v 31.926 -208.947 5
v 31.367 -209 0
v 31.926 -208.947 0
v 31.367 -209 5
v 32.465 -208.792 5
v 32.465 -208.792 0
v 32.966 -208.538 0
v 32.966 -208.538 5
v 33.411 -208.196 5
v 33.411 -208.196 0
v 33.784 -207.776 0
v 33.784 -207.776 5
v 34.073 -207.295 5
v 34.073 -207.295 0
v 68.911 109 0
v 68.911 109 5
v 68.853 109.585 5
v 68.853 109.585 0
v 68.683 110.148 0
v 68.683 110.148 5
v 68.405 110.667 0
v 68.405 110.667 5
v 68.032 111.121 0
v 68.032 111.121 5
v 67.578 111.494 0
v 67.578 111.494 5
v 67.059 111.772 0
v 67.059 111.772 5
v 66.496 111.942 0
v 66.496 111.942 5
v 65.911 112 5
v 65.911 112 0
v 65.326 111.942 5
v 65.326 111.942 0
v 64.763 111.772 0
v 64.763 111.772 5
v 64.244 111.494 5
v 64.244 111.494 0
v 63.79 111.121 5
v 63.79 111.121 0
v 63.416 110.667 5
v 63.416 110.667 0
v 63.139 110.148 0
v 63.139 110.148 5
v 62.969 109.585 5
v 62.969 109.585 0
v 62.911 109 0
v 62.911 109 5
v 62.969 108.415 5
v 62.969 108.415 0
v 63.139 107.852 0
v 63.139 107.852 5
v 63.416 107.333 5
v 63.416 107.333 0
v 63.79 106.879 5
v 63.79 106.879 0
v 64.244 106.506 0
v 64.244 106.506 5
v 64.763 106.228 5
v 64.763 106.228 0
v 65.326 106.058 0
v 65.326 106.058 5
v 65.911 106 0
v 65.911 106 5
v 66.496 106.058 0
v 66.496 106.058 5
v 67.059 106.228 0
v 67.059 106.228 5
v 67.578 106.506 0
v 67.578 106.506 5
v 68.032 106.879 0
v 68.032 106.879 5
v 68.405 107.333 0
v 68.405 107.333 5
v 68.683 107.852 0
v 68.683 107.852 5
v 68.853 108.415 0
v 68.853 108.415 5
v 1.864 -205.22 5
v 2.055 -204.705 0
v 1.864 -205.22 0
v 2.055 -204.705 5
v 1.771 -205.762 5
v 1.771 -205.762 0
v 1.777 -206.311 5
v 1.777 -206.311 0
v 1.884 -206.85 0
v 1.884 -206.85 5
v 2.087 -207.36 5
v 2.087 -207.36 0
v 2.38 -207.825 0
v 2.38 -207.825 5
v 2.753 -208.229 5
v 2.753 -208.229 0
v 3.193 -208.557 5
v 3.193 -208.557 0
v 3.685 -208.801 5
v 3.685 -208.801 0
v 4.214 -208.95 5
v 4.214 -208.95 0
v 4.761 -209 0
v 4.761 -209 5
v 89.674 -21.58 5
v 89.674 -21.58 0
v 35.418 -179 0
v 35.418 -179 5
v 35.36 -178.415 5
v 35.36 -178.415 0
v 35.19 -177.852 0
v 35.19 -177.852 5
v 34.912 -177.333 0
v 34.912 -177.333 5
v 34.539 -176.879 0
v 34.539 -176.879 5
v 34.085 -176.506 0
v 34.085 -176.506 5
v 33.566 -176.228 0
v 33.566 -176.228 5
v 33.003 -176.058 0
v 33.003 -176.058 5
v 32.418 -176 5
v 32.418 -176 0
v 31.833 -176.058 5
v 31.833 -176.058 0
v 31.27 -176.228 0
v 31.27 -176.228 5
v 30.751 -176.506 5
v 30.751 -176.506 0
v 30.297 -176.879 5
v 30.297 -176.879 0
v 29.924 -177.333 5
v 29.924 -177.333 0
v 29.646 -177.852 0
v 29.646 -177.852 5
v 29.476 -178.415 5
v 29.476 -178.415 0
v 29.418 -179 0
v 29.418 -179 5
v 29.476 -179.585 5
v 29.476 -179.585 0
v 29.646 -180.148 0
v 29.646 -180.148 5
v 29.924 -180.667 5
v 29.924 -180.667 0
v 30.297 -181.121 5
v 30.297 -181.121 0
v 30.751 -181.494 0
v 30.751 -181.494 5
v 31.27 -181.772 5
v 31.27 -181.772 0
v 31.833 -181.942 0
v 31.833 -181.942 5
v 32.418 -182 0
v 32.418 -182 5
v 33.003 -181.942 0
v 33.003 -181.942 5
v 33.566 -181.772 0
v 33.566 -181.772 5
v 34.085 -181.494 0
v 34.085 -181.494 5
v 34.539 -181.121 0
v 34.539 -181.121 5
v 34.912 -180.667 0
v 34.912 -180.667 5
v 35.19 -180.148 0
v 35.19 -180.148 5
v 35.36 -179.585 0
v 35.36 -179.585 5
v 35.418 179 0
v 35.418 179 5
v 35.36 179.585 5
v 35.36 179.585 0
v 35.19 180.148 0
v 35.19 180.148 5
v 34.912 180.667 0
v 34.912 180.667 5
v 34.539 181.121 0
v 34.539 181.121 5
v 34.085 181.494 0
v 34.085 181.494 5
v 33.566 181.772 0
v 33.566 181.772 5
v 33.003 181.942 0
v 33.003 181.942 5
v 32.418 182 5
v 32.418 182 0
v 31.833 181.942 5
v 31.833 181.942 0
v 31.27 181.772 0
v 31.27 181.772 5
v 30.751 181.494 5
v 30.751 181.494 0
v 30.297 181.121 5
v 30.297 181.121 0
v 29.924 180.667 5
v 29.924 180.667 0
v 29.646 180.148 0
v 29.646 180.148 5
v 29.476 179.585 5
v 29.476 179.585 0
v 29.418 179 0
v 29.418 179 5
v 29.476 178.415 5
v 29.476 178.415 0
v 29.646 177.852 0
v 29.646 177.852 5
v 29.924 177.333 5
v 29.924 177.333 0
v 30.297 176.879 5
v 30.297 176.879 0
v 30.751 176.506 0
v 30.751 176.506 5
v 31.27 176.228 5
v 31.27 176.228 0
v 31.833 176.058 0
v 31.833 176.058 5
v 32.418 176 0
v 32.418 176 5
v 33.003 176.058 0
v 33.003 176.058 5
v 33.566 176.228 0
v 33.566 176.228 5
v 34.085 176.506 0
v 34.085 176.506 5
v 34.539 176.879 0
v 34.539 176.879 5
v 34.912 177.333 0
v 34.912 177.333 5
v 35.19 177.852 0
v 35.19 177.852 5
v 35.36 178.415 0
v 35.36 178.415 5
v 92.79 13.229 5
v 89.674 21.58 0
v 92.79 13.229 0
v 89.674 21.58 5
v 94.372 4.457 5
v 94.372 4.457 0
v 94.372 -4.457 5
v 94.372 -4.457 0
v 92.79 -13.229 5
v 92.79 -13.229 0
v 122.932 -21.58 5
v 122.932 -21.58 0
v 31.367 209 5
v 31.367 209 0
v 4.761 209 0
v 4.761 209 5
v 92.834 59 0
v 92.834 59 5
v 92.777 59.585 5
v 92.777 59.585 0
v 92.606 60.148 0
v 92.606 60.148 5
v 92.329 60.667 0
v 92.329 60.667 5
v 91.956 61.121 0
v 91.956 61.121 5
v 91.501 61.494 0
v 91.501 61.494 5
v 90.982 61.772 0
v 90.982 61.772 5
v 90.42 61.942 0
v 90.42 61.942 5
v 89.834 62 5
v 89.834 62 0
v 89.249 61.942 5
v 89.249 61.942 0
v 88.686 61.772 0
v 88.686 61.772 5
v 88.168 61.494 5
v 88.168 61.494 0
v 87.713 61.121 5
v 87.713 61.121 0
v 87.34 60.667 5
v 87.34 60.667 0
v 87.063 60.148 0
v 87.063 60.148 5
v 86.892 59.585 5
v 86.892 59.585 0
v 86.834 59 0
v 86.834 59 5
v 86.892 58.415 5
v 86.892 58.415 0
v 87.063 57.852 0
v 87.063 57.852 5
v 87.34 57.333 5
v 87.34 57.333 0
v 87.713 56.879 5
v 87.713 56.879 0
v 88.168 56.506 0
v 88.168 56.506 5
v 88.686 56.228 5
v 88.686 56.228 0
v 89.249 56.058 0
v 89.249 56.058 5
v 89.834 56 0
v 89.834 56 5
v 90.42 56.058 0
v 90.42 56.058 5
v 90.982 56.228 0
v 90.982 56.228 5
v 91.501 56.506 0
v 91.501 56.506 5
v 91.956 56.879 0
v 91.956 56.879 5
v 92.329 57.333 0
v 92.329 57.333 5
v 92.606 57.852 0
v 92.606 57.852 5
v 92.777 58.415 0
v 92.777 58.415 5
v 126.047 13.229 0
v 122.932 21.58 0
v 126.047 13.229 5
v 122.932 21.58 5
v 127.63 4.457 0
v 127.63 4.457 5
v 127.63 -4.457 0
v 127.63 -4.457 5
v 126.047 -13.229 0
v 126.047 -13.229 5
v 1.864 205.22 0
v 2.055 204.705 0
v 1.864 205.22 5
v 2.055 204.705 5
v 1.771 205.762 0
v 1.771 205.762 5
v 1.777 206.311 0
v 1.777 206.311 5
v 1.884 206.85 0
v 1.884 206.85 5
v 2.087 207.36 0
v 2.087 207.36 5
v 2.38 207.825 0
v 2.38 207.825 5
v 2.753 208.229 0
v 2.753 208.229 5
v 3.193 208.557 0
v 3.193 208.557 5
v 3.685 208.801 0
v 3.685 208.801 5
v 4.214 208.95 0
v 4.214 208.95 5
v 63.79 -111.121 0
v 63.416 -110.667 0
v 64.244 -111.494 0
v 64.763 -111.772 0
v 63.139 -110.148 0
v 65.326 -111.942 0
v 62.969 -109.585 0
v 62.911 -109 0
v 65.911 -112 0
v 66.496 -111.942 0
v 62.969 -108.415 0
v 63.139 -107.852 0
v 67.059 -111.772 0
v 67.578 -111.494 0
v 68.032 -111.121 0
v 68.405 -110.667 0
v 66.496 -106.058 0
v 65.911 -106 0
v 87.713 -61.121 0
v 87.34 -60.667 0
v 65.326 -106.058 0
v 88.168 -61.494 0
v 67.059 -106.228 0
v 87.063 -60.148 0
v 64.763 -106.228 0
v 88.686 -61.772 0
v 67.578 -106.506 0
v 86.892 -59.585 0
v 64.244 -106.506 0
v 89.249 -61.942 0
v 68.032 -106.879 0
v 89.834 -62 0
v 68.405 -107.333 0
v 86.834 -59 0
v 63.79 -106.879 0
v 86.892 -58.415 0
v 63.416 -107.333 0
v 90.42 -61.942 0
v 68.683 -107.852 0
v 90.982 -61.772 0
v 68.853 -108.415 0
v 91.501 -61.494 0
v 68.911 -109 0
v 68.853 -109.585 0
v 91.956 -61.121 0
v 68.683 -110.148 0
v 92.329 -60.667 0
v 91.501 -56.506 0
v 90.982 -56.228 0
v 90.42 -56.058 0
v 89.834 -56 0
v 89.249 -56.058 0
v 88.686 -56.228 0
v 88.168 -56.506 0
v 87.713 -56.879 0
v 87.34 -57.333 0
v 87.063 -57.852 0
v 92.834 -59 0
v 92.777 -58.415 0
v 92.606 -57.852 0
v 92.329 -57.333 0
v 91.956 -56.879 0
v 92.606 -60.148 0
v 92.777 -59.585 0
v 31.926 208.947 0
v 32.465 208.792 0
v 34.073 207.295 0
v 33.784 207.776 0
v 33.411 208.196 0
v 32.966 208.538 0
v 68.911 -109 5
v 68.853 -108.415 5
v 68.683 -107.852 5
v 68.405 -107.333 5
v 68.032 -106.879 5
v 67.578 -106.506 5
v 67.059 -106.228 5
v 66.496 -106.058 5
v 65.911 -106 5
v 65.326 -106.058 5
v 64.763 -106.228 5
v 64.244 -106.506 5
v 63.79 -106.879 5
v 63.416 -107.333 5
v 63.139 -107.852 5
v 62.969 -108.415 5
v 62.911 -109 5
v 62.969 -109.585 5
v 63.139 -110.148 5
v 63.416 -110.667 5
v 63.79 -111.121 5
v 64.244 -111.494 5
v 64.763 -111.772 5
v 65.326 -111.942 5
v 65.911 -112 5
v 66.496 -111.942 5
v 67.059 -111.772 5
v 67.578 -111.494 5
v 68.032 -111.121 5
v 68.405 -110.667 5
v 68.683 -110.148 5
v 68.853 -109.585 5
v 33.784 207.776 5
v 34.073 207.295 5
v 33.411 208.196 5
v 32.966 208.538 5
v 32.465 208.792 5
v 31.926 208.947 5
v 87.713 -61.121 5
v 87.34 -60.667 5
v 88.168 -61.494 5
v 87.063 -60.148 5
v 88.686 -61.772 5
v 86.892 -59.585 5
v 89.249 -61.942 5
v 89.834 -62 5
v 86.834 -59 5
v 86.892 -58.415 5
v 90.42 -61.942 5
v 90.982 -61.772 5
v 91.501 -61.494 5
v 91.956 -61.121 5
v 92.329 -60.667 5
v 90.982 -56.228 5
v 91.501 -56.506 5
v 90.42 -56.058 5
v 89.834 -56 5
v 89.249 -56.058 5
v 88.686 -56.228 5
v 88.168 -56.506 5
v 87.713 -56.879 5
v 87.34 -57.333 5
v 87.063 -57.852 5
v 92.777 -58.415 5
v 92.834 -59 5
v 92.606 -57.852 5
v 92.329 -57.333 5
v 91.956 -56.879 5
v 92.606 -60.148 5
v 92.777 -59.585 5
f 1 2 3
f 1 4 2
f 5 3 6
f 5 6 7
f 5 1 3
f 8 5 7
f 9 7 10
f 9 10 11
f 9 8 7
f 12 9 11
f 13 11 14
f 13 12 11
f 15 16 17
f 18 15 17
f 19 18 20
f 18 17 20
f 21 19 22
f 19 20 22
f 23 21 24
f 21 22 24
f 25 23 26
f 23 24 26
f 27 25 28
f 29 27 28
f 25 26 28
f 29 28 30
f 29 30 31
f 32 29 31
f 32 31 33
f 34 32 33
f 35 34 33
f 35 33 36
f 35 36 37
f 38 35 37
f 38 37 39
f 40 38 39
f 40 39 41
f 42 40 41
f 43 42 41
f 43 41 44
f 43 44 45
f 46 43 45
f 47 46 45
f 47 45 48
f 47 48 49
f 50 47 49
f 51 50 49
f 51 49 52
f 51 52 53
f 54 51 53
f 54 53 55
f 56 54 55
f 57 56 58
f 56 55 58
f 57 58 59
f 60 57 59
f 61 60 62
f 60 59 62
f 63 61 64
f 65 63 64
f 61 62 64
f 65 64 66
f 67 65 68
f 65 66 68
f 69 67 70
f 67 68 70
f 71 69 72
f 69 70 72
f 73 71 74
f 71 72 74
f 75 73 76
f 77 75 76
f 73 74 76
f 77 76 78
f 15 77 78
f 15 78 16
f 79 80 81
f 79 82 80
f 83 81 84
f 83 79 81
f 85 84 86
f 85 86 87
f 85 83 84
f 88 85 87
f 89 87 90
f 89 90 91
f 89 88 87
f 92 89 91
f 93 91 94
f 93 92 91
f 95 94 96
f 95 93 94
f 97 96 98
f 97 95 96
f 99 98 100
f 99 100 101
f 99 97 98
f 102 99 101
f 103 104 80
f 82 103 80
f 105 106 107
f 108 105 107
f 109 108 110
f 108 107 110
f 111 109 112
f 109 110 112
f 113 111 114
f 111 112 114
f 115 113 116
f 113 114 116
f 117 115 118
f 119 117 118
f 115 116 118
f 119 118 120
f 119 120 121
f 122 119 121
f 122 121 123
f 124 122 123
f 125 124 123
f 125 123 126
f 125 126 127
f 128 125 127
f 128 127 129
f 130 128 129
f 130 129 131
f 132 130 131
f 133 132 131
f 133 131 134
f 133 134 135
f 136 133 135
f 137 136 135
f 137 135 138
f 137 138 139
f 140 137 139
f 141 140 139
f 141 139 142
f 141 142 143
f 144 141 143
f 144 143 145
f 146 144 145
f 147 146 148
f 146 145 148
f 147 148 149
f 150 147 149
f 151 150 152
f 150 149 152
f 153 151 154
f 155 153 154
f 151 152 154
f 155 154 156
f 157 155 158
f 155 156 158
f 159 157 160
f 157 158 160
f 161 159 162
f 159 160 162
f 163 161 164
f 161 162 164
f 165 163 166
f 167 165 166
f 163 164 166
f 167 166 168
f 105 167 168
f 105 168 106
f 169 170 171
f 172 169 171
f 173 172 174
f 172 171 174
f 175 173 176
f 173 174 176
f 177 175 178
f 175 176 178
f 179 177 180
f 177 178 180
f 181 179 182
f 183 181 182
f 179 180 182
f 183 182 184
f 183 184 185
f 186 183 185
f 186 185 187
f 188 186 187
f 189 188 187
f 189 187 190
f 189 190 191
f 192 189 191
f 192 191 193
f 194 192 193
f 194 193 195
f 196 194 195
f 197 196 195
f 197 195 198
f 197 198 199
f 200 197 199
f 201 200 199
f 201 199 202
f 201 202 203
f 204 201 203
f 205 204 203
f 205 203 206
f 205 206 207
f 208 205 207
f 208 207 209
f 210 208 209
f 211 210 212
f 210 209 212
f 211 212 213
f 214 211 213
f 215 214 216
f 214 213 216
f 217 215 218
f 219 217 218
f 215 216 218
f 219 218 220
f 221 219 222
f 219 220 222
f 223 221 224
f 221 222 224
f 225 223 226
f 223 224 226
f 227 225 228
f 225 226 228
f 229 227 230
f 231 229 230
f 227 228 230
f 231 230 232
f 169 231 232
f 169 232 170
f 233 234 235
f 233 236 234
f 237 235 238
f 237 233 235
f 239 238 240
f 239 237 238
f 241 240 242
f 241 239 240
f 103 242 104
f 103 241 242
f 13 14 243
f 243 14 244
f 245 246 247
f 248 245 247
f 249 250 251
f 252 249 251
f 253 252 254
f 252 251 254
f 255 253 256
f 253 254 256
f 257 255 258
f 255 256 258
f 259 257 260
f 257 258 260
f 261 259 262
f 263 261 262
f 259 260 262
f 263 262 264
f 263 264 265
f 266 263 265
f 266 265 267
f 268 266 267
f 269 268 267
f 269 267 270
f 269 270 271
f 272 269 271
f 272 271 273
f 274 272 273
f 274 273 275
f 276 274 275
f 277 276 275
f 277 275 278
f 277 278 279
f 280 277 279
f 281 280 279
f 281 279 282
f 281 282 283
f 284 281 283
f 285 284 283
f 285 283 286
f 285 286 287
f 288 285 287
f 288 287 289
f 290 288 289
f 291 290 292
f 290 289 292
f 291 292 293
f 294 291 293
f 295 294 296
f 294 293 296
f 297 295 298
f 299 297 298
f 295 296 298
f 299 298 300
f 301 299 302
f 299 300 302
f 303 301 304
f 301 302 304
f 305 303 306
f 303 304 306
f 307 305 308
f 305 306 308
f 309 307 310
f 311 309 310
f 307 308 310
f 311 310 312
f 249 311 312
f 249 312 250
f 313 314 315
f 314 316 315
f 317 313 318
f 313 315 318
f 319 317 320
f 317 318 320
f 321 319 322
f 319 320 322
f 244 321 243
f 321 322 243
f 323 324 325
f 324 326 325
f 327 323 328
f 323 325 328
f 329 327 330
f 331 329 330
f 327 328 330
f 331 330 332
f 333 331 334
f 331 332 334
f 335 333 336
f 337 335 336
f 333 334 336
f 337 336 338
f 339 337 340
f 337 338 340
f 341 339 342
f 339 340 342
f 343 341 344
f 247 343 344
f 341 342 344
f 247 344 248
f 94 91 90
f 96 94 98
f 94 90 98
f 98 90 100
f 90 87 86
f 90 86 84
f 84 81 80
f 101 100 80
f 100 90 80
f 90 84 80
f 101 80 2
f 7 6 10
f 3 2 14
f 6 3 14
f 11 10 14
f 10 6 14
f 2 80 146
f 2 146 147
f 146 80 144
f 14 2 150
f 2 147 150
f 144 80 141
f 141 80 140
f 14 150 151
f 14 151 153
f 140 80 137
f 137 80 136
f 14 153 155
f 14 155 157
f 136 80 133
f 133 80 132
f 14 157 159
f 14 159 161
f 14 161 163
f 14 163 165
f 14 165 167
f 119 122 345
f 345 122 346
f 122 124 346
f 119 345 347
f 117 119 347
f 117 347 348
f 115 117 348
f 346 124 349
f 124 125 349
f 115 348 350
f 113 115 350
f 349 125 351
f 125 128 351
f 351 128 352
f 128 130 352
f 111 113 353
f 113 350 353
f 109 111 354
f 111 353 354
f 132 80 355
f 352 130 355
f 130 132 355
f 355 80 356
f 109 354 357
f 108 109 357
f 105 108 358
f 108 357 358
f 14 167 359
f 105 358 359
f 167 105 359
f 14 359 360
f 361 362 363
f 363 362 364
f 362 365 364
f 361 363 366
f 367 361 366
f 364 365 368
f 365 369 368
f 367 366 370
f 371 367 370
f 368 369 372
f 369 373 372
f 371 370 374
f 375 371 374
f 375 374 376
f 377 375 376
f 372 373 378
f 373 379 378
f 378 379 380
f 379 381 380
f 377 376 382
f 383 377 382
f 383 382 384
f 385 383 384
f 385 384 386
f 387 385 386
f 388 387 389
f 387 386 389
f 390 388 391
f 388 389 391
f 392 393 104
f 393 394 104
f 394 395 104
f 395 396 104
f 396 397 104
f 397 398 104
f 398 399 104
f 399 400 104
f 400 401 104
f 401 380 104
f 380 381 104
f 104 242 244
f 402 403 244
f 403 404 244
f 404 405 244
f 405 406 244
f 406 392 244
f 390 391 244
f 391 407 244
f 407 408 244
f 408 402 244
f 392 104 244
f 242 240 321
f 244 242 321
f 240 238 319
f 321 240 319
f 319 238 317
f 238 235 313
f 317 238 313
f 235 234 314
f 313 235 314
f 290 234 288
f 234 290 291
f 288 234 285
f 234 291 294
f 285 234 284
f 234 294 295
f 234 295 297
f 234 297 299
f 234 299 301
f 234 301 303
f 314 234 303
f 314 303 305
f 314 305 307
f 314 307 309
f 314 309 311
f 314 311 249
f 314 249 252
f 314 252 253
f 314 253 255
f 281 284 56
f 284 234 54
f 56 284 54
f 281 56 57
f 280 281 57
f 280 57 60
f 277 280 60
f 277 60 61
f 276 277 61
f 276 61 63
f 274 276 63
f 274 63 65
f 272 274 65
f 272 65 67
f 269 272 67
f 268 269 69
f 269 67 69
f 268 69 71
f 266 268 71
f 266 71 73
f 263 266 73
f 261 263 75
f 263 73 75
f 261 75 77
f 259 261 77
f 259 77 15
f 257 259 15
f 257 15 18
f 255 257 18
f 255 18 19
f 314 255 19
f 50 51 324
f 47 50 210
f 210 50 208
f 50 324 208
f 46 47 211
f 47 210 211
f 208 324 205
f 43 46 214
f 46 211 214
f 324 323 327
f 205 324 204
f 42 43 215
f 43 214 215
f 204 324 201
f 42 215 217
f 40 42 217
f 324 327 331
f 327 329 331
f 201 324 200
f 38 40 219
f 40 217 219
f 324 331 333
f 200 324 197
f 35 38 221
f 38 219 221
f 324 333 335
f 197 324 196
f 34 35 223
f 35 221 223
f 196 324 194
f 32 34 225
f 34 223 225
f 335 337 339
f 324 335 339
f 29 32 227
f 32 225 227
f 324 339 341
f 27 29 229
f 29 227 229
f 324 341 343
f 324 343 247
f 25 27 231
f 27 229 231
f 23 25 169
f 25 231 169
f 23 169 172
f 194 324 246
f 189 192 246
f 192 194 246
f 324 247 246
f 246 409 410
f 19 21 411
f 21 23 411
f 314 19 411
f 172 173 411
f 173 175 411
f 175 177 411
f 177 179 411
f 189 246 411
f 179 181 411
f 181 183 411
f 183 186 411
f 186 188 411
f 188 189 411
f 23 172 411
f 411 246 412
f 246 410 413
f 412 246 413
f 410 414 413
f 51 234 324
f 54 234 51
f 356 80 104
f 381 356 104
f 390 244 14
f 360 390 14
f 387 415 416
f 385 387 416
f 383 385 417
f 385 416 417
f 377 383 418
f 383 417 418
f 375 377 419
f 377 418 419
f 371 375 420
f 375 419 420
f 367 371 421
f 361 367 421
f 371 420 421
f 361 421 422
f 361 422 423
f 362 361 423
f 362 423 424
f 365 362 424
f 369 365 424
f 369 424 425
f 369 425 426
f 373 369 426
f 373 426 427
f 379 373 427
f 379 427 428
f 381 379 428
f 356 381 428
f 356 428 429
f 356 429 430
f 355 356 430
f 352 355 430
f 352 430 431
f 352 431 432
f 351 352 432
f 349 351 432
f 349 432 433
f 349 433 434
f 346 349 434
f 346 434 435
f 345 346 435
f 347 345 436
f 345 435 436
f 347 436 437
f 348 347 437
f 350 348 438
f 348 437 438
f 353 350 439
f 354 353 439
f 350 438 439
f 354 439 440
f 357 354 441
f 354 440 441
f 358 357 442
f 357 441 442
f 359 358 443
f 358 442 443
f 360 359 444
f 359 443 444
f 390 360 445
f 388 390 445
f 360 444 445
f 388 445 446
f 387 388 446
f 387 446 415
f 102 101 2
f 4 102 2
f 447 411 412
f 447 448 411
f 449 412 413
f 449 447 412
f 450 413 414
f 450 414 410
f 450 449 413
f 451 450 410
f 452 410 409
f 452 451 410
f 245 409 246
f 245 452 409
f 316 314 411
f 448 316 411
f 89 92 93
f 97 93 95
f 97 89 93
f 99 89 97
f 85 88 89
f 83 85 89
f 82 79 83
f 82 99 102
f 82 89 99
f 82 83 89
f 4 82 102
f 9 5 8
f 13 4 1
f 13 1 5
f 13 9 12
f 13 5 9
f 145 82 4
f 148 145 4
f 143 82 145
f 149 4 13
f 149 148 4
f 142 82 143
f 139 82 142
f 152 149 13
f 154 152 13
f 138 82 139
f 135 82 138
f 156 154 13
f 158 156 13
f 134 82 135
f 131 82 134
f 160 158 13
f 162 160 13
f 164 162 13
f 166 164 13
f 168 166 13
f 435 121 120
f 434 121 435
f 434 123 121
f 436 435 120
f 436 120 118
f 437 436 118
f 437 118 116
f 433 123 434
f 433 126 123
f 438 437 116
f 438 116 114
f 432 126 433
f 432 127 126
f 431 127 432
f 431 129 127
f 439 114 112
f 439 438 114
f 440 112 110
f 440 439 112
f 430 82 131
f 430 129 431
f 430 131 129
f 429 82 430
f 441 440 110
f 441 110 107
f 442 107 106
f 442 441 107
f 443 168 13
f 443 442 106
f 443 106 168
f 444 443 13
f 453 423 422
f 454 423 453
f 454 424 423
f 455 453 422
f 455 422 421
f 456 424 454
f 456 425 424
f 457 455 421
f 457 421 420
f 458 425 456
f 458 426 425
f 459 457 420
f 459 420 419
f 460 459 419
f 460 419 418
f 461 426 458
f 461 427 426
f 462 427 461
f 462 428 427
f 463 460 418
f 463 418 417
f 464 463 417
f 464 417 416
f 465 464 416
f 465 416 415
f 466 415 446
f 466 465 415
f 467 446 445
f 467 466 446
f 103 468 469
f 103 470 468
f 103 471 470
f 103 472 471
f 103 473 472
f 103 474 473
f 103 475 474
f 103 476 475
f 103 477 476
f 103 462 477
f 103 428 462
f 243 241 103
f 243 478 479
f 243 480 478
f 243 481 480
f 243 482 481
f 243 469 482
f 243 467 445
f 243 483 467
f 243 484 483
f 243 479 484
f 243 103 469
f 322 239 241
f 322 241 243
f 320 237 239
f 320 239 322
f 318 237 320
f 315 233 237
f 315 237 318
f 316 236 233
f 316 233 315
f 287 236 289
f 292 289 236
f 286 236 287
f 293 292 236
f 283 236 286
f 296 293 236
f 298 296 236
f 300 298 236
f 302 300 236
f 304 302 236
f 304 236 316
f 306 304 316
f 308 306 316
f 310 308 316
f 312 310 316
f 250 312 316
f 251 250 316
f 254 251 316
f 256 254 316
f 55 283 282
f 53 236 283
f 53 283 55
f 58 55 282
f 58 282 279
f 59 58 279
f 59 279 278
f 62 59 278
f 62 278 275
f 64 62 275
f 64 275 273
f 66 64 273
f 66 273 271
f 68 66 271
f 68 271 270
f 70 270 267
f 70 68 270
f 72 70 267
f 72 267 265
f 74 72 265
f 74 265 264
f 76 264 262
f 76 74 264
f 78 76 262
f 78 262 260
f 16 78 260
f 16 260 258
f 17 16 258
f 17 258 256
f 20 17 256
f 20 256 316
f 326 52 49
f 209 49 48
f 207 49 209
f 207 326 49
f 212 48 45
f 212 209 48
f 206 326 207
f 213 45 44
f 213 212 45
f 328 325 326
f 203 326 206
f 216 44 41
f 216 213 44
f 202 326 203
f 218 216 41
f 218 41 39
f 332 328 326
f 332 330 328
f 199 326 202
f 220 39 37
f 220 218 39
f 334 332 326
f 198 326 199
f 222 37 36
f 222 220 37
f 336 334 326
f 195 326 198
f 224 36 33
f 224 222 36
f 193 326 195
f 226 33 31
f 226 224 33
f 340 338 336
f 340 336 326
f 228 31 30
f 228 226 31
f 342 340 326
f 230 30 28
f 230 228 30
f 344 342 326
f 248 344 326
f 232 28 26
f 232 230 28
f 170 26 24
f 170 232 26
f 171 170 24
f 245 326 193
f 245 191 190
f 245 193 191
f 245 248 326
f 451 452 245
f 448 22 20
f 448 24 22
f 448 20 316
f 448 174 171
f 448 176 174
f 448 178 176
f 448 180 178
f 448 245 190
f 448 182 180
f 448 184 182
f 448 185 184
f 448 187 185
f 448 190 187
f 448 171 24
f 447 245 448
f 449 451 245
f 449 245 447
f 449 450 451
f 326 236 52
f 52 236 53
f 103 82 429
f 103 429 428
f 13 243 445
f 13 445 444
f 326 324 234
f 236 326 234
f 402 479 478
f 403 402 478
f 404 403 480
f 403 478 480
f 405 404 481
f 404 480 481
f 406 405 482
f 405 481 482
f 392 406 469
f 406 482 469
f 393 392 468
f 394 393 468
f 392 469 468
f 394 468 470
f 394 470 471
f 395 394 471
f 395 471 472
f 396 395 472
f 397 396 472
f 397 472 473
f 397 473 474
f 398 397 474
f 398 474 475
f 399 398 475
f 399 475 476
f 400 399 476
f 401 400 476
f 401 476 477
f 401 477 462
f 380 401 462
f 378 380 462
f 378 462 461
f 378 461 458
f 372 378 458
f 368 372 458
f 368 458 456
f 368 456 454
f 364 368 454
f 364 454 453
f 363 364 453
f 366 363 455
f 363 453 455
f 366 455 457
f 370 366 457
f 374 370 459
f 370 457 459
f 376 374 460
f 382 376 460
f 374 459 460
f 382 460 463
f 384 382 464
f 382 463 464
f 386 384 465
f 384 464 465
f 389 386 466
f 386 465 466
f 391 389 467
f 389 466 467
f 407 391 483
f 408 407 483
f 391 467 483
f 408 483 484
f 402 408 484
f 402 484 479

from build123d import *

# Parameters (mm, degrees)
Y_KSEKLIK_EKSTR_ZYON1_DEPTH = 5
RADYUS1_R                   = 3
RADYUS2_R                   = 50
IZIM2_R                     = 3
KES_EKSTR_ZYON1_DEPTH       = 10


with BuildPart() as part:
    # Çizim1 → Yükseklik-Ekstrüzyon1 (new body)
    with BuildSketch(Plane.XY):
        Polygon((0, 209), (100, 0), (0, -209), (33.257168235, -209), (133.257168235, 0), (33.257168235, 209), align=None)
    extrude(amount=Y_KSEKLIK_EKSTR_ZYON1_DEPTH)

    # Radyus1
    radyus1_edges = [part.edges().sort_by_distance(p)[0] for p in [
        (0, -209, 2.5),
        (0, 209, 2.5),
        (33.257168235, 209, 2.5),
        (33.257168235, -209, 2.5),
    ]]
    fillet(radyus1_edges, radius=RADYUS1_R)

    # Radyus2
    radyus2_edges = [part.edges().sort_by_distance(p)[0] for p in [
        (100, 0, 2.5),
        (133.257168235, 0, 2.5),
    ]]
    fillet(radyus2_edges, radius=RADYUS2_R)

    # Çizim2 → Kes-Ekstrüzyon1 (cut)
    with BuildSketch(Plane.XY.offset(5)):
        with Locations((32.418057802, 179)):
            Circle(IZIM2_R)
        with Locations((65.910880768, 109)):
            Circle(IZIM2_R)
        with Locations((89.834325744, 59)):
            Circle(IZIM2_R)
        with Locations((89.834325744, -59)):
            Circle(IZIM2_R)
        with Locations((65.910880768, -109)):
            Circle(IZIM2_R)
        with Locations((32.418057802, -179)):
            Circle(IZIM2_R)
    extrude(amount=-KES_EKSTR_ZYON1_DEPTH, mode=Mode.SUBTRACT)


solid = part.part
